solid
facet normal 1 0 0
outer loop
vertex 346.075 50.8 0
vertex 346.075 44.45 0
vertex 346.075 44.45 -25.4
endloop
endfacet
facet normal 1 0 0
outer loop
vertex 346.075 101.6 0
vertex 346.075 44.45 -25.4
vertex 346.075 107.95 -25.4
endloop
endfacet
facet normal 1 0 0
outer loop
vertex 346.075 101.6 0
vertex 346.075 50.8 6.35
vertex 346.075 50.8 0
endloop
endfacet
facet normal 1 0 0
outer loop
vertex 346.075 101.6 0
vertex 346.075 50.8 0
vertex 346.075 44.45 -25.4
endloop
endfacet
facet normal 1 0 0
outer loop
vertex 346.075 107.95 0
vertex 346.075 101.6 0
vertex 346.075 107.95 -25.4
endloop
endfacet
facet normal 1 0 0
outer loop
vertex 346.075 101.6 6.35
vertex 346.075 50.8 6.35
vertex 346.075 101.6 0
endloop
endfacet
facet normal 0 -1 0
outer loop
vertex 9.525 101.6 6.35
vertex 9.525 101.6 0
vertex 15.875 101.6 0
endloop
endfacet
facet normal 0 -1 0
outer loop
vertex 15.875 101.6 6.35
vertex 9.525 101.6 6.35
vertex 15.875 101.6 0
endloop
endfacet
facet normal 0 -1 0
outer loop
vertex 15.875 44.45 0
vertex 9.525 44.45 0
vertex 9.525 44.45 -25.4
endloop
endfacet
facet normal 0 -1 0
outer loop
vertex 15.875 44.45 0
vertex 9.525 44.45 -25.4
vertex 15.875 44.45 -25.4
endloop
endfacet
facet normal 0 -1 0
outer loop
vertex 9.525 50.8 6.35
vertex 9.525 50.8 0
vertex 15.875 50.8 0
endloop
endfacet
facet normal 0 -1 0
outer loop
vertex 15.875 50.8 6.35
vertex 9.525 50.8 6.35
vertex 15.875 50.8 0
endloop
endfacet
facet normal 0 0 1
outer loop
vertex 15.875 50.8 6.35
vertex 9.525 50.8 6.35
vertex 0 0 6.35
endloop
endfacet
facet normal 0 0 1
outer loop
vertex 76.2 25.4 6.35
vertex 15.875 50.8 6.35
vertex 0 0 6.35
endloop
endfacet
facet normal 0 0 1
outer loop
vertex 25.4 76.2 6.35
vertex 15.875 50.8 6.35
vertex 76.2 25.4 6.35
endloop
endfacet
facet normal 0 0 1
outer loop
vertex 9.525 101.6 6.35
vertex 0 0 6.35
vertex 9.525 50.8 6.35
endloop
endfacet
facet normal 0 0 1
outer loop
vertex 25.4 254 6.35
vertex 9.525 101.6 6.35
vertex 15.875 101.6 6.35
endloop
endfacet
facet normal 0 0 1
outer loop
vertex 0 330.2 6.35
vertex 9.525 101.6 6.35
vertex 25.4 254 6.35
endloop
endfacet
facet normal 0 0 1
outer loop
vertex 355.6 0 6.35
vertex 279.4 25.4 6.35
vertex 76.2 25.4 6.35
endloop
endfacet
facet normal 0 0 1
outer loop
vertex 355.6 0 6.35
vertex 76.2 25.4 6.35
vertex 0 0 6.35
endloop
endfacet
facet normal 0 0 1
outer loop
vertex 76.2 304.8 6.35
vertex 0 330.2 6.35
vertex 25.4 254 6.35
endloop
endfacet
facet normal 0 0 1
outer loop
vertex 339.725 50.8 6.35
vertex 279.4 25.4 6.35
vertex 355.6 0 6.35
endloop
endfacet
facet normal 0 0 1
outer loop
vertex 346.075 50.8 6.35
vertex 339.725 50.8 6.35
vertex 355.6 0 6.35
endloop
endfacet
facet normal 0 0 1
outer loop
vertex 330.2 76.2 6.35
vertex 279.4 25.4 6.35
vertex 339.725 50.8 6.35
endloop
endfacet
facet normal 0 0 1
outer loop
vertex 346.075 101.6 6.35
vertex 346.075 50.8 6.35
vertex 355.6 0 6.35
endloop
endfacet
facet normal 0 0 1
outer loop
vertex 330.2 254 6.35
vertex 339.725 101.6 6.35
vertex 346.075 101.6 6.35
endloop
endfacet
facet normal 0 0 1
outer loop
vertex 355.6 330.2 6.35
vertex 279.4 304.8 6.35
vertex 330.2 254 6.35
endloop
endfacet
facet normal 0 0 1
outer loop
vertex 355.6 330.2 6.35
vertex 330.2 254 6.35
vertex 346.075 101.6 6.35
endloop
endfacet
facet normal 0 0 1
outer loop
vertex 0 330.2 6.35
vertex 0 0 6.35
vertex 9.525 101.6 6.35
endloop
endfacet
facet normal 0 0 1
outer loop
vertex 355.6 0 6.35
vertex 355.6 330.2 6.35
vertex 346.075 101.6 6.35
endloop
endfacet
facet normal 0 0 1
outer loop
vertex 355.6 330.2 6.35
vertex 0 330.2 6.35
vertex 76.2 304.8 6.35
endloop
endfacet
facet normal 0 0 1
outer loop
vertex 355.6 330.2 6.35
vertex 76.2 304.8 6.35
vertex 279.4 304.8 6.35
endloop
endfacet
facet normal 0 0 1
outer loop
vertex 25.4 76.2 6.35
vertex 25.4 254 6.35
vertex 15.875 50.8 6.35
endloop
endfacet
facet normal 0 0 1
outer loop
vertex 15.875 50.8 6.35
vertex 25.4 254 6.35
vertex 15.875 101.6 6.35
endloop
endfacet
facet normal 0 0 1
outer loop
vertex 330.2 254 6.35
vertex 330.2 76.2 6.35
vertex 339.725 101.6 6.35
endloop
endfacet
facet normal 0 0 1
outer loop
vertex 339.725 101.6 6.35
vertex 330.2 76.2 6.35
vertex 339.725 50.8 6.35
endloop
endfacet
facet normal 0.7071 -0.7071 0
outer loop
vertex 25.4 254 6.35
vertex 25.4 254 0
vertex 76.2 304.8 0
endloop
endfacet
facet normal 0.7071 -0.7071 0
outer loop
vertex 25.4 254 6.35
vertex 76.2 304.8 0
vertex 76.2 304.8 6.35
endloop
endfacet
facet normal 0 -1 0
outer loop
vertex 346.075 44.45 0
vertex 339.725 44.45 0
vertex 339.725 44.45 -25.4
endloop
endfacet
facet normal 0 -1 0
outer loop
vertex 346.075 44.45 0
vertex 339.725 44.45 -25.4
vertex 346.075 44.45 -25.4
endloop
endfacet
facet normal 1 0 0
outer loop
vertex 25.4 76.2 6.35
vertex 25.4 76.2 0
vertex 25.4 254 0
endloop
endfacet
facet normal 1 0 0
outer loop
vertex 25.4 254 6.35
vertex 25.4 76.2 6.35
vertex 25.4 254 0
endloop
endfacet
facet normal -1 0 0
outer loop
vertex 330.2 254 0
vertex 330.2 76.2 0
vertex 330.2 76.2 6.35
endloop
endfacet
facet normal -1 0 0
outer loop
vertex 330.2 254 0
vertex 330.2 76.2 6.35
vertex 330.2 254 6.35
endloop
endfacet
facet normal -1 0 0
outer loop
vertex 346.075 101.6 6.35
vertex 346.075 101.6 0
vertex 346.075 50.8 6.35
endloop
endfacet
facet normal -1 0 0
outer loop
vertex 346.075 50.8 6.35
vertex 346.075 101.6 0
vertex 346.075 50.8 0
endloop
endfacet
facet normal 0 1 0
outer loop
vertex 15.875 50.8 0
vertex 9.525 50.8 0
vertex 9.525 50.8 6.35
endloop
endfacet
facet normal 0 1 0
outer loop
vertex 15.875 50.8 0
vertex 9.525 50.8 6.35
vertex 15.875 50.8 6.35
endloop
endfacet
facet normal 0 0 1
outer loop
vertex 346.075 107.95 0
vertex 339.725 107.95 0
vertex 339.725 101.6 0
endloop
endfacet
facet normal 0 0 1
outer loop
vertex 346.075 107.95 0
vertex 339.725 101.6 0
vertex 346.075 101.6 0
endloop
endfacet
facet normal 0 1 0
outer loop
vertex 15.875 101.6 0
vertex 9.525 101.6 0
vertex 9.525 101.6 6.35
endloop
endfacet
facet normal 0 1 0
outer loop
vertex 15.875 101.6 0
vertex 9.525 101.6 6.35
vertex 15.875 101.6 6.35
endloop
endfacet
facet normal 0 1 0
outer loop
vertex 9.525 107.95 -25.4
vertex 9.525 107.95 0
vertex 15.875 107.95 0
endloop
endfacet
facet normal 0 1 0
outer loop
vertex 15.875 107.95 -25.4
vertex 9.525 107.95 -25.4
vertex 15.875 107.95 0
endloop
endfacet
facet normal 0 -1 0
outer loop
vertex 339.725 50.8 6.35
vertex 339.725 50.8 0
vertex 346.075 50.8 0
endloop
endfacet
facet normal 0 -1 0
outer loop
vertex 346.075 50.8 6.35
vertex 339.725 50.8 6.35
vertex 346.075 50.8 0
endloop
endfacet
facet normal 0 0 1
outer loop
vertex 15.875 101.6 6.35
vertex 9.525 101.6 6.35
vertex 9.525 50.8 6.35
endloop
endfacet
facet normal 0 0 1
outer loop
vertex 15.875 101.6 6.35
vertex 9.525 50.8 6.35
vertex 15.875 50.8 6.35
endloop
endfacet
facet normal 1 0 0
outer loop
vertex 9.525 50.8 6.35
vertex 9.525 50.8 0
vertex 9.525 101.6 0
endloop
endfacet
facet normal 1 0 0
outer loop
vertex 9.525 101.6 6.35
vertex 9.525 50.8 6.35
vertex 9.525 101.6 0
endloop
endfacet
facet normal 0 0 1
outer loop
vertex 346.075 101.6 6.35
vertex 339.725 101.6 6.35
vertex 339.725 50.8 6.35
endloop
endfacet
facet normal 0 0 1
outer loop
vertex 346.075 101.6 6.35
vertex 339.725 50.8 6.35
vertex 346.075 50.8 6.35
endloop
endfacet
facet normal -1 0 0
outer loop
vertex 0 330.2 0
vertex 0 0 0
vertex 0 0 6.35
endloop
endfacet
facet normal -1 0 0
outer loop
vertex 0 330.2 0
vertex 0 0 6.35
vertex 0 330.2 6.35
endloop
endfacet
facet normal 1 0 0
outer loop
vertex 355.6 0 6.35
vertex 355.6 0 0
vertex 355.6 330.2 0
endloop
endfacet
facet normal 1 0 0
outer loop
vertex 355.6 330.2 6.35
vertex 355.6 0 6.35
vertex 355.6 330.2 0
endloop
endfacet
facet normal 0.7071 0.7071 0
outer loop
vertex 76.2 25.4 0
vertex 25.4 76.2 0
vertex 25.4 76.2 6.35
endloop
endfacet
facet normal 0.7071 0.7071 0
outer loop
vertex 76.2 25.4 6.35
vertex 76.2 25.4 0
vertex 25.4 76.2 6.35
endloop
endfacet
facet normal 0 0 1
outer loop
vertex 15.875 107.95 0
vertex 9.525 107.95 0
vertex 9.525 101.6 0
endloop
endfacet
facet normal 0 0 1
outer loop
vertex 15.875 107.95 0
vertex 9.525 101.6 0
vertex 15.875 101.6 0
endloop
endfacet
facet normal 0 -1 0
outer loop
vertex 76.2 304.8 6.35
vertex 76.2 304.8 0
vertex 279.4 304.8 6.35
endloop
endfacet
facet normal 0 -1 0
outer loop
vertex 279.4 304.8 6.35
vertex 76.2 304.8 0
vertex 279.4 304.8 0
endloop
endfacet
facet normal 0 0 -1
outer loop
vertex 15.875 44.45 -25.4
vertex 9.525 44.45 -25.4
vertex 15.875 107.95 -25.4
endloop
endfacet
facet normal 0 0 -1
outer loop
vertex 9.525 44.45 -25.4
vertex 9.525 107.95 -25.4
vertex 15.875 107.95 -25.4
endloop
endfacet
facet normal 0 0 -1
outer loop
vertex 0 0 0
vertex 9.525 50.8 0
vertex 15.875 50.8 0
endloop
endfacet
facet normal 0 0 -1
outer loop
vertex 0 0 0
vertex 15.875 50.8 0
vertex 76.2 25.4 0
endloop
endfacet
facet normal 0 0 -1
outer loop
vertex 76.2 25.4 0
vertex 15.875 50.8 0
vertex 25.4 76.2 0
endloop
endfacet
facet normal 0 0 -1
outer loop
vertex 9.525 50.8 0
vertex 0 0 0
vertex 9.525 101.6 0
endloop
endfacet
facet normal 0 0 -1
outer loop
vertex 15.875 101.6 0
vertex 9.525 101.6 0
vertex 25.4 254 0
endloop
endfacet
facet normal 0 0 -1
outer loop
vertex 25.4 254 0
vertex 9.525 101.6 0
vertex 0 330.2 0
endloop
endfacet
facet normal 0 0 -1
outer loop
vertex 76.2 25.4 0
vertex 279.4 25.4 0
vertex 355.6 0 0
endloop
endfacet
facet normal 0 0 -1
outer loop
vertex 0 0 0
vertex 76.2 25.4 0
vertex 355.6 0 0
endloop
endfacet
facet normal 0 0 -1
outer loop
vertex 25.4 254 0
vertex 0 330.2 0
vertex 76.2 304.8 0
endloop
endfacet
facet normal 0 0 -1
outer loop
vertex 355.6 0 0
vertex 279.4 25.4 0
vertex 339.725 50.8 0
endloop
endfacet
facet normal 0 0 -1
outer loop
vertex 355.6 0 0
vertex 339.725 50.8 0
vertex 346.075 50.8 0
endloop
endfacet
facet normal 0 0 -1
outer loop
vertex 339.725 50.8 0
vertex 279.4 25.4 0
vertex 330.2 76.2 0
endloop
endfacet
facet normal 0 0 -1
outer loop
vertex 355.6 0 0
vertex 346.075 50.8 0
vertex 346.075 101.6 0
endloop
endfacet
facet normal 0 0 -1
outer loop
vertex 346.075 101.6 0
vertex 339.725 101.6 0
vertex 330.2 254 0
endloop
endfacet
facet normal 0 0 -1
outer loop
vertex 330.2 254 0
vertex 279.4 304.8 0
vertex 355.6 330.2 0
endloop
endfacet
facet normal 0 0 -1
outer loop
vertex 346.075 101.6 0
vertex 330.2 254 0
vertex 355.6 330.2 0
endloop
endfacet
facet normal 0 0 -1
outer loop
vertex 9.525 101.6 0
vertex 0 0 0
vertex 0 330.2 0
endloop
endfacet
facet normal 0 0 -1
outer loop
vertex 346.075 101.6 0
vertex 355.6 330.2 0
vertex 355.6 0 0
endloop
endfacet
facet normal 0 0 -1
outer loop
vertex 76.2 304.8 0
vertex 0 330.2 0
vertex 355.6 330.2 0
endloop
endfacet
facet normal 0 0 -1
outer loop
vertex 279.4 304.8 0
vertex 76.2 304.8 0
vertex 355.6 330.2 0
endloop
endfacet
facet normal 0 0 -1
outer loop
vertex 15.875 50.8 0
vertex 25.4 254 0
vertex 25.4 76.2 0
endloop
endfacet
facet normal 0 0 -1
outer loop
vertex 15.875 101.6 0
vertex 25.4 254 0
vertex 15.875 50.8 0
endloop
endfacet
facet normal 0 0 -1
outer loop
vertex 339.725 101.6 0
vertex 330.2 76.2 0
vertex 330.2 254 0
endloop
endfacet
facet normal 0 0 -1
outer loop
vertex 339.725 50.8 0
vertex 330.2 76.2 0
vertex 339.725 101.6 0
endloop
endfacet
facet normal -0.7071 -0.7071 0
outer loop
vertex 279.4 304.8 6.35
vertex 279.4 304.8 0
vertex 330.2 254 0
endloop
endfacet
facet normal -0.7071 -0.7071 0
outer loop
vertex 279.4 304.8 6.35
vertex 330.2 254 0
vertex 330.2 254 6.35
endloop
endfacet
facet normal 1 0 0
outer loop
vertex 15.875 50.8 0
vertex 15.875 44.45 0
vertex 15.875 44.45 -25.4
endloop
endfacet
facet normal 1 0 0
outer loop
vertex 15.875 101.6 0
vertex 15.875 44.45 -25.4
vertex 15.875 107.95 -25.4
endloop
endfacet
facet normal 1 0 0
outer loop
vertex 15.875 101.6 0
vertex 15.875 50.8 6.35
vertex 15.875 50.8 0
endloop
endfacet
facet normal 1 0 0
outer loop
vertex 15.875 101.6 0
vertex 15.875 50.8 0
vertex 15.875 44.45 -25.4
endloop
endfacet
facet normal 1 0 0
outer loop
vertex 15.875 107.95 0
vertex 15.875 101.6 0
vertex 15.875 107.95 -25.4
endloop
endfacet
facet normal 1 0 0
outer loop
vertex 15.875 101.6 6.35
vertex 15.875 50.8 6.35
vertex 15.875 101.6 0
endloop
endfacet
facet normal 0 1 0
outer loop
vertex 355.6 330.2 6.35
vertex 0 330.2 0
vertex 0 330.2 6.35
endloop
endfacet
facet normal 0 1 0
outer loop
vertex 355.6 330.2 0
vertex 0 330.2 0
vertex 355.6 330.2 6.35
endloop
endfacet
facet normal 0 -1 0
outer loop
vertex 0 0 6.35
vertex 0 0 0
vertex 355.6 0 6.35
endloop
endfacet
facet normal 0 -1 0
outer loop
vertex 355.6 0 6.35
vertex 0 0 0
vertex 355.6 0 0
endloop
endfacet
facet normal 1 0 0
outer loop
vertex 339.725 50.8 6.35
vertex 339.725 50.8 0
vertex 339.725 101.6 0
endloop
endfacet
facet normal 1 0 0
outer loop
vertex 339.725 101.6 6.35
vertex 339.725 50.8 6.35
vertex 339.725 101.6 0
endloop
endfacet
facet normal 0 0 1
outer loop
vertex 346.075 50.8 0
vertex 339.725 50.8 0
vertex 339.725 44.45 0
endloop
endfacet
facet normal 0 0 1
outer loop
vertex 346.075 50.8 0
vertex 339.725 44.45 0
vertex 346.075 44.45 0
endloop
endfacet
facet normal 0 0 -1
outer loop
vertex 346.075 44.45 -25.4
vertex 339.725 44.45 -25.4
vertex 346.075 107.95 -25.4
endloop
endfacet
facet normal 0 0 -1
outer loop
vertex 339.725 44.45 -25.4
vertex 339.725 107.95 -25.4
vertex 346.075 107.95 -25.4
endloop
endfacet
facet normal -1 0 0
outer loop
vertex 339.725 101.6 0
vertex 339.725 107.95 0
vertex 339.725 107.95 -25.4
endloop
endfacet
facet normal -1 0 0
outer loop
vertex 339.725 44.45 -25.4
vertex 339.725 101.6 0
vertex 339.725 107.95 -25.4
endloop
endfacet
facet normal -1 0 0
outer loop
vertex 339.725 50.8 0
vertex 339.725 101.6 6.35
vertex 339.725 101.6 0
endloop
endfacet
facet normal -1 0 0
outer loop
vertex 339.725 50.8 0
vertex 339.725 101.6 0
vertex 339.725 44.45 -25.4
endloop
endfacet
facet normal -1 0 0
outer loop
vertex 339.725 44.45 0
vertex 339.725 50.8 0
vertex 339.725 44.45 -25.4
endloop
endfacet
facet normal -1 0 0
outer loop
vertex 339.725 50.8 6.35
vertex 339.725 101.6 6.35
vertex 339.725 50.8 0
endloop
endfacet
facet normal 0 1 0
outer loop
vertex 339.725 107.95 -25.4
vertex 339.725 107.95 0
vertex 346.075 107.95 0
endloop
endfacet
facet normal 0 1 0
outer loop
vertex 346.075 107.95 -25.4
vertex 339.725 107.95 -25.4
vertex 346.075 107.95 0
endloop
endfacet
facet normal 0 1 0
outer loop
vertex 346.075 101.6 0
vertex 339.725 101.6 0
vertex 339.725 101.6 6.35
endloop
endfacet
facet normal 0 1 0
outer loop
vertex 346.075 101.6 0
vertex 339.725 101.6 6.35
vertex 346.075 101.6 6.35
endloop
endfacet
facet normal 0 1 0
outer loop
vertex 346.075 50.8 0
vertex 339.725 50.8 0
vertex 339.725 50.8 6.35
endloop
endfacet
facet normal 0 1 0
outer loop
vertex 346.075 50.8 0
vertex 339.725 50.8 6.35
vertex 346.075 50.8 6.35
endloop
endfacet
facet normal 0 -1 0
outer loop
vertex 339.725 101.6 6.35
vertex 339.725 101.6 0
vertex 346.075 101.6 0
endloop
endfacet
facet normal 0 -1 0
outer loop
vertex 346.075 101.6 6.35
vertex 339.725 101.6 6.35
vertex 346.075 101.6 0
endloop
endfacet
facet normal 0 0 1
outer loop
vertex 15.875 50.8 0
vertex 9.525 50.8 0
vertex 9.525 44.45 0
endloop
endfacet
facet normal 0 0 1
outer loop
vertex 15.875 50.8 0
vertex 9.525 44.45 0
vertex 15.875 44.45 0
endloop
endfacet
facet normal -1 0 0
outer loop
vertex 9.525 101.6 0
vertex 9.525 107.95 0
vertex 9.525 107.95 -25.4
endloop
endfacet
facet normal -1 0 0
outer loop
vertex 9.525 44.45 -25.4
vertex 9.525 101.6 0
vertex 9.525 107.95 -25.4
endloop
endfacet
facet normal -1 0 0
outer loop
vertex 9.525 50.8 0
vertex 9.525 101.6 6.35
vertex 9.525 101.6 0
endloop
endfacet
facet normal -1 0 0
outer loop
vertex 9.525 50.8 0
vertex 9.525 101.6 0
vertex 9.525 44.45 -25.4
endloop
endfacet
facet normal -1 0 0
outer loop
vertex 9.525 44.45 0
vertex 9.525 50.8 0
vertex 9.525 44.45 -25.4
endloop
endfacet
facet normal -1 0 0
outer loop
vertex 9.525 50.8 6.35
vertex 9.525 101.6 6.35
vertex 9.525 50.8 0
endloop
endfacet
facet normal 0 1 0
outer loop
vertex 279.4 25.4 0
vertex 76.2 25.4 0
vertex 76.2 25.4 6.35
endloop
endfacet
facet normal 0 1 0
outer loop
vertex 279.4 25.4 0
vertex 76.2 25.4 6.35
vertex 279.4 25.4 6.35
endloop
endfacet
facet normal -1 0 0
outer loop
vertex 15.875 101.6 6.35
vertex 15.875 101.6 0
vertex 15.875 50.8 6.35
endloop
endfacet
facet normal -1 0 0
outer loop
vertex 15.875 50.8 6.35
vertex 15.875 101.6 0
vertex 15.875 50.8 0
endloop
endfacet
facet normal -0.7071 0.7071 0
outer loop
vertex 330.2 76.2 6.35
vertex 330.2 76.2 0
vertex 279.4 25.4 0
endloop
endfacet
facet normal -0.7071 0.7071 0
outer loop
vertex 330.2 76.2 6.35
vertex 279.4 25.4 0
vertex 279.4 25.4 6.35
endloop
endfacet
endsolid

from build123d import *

# Parameters (mm, degrees)
F0_W     = 355.6
F0_H     = 330.2
F0_W_2   = 304.8
F0_H_2   = 279.4
F0_W_3   = 6.35
F0_H_3   = 6.35
F1_DEPTH = 6.35
F2_SIZE  = 50.8
F0_H_4   = 50.8
F3_DEPTH = 6.35
F4_DEPTH = 25.4


with BuildPart() as f1:
    # F0 (on Top) → F1 (new body)
    with BuildSketch(Plane.XY):
        with Locations((177.8, 165.1)):
            Rectangle(F0_W, F0_H)
        Polygon((9.525, 44.45), (9.525, 50.8), (9.525, 101.6), (9.525, 107.95), (15.875, 107.95), (15.875, 101.6), (15.875, 50.8), (15.875, 44.45), align=None, mode=Mode.SUBTRACT)
        Polygon((346.075, 101.6), (346.075, 50.8), (346.075, 44.45), (339.725, 44.45), (339.725, 50.8), (339.725, 101.6), (339.725, 107.95), (346.075, 107.95), align=None, mode=Mode.SUBTRACT)
        with Locations((177.8, 165.1)):
            Rectangle(F0_W_2, F0_H_2, mode=Mode.SUBTRACT)
        with Locations((12.7, 47.625)):
            Rectangle(F0_W_3, F0_H_3)
        with Locations((342.9, 47.625)):
            Rectangle(F0_W_3, F0_H_3)
        with Locations((342.9, 104.775)):
            Rectangle(F0_W_3, F0_H_3)
        with Locations((12.7, 104.775)):
            Rectangle(F0_W_3, F0_H_3)
    extrude(amount=F1_DEPTH)

    # F2
    f2_edges = [f1.edges().sort_by_distance(p)[0] for p in [
        (25.4, 304.8, 3.175),
        (25.4, 25.4, 3.175),
        (330.2, 25.4, 3.175),
        (330.2, 304.8, 3.175),
    ]]
    chamfer(f2_edges, length=F2_SIZE)


with BuildPart() as f3:
    # F0 (on Top) → F3 (new body, through all)
    with BuildSketch(Plane.XY):
        with Locations((12.7, 76.2)):
            Rectangle(F0_W_3, F0_H_4)
    extrude(amount=F3_DEPTH)

    # F0 (on Top) → F4 (join)
    with BuildSketch(Plane.XY):
        with Locations((12.7, 47.625)):
            Rectangle(F0_W_3, F0_H_3)
        with Locations((12.7, 76.2)):
            Rectangle(F0_W_3, F0_H_4)
        with Locations((12.7, 104.775)):
            Rectangle(F0_W_3, F0_H_3)
    extrude(amount=-F4_DEPTH)


with BuildPart() as f3b:
    # F0 (on Top) → F3, piece 2 (new body, through all)
    with BuildSketch(Plane.XY):
        with Locations((342.9, 76.2)):
            Rectangle(F0_W_3, F0_H_4)
    extrude(amount=F3_DEPTH)

    # F0 (on Top) → F4, piece 2 (join)
    with BuildSketch(Plane.XY):
        with Locations((342.9, 47.625)):
            Rectangle(F0_W_3, F0_H_3)
        with Locations((342.9, 76.2)):
            Rectangle(F0_W_3, F0_H_4)
        with Locations((342.9, 104.775)):
            Rectangle(F0_W_3, F0_H_3)
    extrude(amount=-F4_DEPTH)


solid = Compound([f1.part, f3.part, f3b.part])
